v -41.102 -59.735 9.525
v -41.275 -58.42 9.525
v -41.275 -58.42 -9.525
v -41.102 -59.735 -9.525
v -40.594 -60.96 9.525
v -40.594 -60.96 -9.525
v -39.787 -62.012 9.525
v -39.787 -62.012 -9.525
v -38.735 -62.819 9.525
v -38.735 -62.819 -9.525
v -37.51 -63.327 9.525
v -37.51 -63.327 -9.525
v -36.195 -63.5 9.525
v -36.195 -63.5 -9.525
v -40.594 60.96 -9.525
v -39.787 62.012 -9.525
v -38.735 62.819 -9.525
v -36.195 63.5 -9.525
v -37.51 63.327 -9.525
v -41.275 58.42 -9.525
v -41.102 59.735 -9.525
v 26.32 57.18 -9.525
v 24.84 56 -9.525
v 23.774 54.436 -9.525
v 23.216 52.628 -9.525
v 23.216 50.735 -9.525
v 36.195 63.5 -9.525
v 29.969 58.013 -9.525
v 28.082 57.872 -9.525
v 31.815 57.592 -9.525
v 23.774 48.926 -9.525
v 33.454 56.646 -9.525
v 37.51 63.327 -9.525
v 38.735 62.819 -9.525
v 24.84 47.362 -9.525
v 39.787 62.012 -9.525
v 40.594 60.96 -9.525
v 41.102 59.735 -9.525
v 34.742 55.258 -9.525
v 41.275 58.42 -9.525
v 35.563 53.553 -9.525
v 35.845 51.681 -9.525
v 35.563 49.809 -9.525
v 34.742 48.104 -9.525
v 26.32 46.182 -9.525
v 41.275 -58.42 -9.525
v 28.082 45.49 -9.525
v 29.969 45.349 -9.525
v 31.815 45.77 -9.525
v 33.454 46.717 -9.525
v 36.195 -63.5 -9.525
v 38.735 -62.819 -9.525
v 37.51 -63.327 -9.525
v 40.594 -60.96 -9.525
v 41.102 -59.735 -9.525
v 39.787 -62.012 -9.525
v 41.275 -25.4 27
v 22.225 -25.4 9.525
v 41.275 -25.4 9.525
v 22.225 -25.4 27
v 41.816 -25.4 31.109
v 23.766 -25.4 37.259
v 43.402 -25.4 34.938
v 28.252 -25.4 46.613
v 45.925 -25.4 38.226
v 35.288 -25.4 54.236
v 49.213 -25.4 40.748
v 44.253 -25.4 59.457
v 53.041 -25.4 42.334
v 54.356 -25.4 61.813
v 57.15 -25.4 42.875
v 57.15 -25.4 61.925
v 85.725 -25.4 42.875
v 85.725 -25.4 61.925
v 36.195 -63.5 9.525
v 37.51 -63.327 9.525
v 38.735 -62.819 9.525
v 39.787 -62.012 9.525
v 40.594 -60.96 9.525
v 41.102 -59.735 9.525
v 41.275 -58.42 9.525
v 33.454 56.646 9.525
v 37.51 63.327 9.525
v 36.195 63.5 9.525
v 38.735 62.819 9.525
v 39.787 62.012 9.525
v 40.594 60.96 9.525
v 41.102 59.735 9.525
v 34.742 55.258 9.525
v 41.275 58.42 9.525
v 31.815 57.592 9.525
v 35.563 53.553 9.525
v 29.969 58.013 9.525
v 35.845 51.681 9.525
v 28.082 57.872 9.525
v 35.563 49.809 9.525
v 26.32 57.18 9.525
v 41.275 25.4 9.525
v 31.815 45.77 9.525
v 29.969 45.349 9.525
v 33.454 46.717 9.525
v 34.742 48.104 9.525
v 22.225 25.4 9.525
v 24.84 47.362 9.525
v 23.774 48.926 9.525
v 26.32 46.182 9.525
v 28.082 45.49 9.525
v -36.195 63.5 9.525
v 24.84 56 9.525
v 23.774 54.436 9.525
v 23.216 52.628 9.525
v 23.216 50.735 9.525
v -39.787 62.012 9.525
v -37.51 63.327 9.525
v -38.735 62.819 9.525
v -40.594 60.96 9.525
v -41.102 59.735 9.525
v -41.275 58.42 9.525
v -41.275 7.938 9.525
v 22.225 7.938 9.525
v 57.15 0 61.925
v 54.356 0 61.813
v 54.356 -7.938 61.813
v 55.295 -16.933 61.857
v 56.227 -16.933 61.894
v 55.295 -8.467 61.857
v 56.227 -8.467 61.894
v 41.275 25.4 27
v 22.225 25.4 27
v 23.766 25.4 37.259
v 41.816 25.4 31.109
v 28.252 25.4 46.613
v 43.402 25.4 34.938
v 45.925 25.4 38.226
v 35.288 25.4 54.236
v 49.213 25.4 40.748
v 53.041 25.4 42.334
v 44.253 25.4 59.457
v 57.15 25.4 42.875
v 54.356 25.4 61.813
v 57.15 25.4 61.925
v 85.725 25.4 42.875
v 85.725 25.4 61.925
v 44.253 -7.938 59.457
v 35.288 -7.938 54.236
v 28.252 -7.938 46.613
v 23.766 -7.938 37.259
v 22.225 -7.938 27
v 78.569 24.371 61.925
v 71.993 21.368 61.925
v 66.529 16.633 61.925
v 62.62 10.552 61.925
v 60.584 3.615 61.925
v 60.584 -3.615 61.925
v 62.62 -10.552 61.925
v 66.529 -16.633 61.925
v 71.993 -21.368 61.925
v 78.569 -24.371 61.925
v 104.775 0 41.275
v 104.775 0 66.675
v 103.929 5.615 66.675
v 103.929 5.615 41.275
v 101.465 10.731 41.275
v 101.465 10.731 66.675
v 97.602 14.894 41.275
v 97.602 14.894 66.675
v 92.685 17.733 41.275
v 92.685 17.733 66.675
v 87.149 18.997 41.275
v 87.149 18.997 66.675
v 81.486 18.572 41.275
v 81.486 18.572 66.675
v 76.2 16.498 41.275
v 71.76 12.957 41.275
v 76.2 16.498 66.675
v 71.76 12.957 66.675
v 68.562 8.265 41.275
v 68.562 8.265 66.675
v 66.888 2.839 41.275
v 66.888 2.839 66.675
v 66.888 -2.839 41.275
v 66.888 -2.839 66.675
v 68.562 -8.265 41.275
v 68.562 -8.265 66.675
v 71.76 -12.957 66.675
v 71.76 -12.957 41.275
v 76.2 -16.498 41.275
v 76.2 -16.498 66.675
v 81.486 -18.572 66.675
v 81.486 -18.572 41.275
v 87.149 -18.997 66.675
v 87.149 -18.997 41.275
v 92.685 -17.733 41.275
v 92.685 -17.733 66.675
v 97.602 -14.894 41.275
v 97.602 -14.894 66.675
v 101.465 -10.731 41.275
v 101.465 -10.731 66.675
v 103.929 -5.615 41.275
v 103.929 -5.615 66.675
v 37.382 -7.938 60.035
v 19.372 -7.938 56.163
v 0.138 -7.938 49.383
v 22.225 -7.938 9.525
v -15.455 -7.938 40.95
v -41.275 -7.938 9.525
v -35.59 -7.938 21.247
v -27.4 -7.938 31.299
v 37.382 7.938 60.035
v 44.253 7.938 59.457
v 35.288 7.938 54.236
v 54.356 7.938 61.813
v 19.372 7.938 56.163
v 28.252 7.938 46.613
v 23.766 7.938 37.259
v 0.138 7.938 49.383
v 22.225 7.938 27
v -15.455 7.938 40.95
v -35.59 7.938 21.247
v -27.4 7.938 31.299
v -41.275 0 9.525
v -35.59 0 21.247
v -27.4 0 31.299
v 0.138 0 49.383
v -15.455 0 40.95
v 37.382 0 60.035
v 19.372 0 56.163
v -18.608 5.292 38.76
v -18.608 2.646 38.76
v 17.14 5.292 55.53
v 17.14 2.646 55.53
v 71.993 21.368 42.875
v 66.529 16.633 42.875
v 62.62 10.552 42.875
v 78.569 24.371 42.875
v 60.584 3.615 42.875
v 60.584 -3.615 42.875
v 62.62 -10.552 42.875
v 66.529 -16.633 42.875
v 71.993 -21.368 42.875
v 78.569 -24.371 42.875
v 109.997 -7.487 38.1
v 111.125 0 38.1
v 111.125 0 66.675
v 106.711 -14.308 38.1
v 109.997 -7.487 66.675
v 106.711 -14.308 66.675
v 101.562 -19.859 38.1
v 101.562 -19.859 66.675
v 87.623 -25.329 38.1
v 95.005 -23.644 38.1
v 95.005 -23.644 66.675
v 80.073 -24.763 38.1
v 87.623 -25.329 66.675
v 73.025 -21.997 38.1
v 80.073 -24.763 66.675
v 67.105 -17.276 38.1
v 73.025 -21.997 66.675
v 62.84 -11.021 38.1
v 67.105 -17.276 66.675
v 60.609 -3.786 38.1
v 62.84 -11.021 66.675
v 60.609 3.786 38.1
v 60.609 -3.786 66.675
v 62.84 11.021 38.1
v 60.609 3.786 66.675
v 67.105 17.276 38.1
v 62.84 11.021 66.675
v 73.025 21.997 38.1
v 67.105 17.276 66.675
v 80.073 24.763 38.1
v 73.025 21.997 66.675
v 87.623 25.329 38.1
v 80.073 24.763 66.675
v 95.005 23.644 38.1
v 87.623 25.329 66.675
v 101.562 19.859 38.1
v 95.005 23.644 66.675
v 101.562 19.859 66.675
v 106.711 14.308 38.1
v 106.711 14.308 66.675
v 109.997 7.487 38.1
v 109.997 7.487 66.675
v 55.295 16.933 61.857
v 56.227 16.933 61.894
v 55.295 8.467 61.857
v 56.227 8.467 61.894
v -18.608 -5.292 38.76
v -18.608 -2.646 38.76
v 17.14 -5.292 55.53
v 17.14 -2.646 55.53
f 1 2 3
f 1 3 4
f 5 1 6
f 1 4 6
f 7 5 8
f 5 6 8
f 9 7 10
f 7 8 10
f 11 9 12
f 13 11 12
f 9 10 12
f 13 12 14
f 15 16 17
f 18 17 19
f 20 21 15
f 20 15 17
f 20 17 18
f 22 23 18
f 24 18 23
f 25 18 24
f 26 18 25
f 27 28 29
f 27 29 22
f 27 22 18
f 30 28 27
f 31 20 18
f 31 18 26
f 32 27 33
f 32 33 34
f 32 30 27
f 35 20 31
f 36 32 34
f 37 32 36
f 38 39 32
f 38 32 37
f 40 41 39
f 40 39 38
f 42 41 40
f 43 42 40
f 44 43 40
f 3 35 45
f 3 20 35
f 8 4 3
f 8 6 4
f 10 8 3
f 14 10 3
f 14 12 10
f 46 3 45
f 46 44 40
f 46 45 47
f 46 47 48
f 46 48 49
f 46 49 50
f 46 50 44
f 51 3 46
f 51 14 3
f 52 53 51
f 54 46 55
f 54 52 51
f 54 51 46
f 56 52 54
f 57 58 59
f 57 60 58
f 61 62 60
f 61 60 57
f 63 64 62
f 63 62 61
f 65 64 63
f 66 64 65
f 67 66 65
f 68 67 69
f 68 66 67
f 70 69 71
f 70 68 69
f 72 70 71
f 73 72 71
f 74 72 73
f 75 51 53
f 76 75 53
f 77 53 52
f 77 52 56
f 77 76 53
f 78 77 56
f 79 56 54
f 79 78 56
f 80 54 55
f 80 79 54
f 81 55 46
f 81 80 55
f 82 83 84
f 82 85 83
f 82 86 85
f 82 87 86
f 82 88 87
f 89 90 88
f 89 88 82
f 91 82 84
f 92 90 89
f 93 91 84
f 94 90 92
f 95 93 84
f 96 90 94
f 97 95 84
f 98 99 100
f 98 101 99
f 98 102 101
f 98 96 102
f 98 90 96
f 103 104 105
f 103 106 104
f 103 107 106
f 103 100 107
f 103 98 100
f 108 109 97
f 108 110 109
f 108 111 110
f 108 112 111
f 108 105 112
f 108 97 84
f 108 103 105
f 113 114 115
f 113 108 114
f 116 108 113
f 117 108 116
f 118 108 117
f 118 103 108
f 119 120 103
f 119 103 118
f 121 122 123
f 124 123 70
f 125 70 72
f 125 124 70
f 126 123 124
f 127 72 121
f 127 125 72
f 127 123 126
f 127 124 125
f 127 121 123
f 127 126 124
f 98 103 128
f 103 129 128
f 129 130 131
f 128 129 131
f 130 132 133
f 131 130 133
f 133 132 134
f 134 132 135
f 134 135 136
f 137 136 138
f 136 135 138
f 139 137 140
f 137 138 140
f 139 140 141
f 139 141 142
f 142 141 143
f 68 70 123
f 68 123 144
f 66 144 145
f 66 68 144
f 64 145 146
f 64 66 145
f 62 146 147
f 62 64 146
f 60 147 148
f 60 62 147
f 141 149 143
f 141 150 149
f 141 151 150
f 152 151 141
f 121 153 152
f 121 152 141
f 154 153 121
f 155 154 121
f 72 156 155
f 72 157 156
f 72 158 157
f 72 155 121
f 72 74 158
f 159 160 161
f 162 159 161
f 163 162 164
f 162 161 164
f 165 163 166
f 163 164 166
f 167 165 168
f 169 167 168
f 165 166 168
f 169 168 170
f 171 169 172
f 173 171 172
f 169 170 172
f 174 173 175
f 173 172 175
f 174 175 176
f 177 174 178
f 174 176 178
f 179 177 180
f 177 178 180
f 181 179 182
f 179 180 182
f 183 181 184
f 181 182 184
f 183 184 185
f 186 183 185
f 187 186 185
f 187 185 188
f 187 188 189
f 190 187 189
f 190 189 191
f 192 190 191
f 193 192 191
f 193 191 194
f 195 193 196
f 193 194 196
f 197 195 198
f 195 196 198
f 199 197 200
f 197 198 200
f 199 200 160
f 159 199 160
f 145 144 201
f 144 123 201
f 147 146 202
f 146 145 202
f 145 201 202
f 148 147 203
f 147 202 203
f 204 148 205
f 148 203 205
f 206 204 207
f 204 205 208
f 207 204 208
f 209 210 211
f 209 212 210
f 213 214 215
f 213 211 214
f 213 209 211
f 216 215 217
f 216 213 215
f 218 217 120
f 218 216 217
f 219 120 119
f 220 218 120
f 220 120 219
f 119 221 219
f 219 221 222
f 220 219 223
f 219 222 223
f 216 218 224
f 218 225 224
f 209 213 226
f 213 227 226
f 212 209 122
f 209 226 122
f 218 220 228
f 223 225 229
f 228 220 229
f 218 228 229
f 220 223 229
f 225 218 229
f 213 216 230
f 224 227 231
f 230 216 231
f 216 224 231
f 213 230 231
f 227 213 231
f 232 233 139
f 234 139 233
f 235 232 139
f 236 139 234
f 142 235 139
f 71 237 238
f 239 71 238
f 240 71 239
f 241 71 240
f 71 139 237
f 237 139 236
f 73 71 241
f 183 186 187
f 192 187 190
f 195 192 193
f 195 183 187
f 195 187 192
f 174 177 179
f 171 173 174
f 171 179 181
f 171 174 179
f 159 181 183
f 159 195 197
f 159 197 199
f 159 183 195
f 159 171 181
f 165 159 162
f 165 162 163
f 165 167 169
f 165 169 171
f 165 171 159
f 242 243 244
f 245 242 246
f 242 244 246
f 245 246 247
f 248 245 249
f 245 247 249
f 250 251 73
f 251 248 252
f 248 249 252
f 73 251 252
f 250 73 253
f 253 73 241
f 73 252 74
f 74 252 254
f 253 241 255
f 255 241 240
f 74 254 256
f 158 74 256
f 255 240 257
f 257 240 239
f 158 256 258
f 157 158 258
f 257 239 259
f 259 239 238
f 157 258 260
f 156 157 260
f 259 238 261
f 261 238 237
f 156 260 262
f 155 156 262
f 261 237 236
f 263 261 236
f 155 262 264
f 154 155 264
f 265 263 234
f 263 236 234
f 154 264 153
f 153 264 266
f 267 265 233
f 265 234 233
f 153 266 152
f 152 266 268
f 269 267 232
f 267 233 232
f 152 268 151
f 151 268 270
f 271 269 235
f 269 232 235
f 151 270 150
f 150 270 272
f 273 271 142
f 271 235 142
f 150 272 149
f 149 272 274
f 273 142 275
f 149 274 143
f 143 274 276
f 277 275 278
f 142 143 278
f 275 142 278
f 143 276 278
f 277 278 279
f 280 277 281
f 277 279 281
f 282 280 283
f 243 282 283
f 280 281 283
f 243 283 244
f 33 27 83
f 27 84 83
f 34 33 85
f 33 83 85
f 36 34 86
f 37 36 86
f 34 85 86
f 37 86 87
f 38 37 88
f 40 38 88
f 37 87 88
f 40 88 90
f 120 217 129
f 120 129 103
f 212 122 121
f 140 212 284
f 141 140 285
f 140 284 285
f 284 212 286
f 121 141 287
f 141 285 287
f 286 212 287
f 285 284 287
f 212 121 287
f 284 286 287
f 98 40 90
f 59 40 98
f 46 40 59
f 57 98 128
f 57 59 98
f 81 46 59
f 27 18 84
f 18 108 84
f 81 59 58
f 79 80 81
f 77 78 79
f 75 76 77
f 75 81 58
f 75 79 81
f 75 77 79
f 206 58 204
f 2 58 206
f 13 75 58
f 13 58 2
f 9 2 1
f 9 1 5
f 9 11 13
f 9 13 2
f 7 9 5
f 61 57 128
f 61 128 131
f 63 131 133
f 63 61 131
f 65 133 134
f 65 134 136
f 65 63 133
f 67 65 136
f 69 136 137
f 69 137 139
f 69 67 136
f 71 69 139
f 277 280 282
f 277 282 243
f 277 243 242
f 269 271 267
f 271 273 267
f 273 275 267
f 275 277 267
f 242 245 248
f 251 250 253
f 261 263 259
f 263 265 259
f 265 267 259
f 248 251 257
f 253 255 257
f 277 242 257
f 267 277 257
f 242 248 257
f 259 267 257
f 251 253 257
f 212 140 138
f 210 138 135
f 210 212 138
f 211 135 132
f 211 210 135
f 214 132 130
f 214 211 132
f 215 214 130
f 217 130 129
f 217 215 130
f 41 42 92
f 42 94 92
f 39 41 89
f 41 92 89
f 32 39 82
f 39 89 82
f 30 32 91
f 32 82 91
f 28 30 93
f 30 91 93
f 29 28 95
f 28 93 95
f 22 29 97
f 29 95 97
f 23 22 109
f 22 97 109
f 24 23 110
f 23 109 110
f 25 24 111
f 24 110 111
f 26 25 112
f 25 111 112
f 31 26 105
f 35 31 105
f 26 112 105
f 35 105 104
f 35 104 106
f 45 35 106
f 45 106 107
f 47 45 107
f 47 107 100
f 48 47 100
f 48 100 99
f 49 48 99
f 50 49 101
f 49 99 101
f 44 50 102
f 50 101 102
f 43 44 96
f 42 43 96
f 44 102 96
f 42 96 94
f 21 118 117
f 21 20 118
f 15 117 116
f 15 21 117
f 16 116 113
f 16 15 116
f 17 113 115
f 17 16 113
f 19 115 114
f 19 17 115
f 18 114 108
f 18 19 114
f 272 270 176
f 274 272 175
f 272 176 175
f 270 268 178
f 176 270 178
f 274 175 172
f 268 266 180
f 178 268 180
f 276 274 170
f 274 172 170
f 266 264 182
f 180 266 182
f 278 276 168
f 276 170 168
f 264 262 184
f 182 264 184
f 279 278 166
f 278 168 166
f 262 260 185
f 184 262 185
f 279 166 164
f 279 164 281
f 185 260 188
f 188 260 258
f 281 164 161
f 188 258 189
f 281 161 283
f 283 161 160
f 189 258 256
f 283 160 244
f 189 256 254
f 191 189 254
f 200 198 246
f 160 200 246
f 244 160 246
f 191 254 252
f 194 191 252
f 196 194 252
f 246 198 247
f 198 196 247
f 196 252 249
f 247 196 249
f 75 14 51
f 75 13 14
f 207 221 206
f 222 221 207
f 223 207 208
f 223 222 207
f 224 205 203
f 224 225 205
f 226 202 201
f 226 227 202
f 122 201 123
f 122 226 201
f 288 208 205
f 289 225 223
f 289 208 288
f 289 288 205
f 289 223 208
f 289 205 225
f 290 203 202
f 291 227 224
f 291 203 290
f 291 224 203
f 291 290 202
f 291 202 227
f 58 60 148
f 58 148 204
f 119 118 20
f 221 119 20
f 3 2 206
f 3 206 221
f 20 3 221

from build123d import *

# Parameters (mm, degrees)
F1_DEPTH = 63.5
F0_W     = 25.4
F0_H     = 19.05
F2_DEPTH = 25.4
F3_DEPTH = 7.9375
F4_R     = 5.08
F6_R     = 6.35
F7_DEPTH = 50.8
F8_R     = 19.05
F9_DEPTH = 25.4


with BuildPart() as f1:
    # F0 (on Front) → F1 (new body, symmetric)
    with BuildSketch(Plane.XZ):
        Polygon((-41.275, -9.525), (41.275, -9.525), (41.275, 9.525), (22.225, 9.525), (-41.275, 9.525), align=None)
    extrude(amount=F1_DEPTH, both=True)

    # F0 (on Front) → F2 (join, symmetric)
    with BuildSketch(Plane.XZ):
        with BuildLine():
            Line((22.225, 9.525), (41.275, 9.525))
            Line((41.275, 9.525), (41.275, 27.0002))
            ThreePointArc((41.275, 27.0002), (45.9246798487, 38.2255201513), (57.15, 42.8752))
            Line((57.15, 42.8752), (60.325, 42.8752))
            Line((60.325, 42.8752), (60.325, 61.9252))
            Line((60.325, 61.9252), (57.15, 61.9252))
            add(Edge.make_bspline(
                [(54.3558038177, 61.8132448639), (55.2992353906, 61.8602813509), (56.2310037171, 61.8975367589), (57.15, 61.9252)],
                knots=[108.500811641, 108.500811641, 108.500811641, 108.500811641, 111.5045361635, 111.5045361635, 111.5045361635, 111.5045361635], degree=3))
            ThreePointArc((54.3558038177, 61.8132448639), (31.4854044775, 50.6874151522), (22.225, 27.0002))
            Line((22.225, 27.0002), (22.225, 9.525))
        make_face()
        with Locations((73.025, 52.4002)):
            Rectangle(F0_W, F0_H)
    extrude(amount=F2_DEPTH, both=True)

    # F0 (on Front) → F3 (join, symmetric)
    with BuildSketch(Plane.XZ):
        with BuildLine():
            add(Edge.make_bspline(
                [(-41.275, 9.525), (-29.0199070695, 45.652726812), (20.2770823423, 60.114188583), (54.3558038177, 61.8132448639)],
                knots=[0, 0, 0, 0, 108.500811641, 108.500811641, 108.500811641, 108.500811641], degree=3))
            Line((-41.275, 9.525), (22.225, 9.525))
            Line((22.225, 9.525), (22.225, 27.0002))
            ThreePointArc((22.225, 27.0002), (31.4854044775, 50.6874151522), (54.3558038177, 61.8132448639))
        make_face()
    extrude(amount=F3_DEPTH, both=True)

    # F4
    f4_edges = [f1.edges().sort_by_distance(p)[0] for p in [
        (41.275, -63.5, 0),
        (-41.275, -63.5, 0),
        (-41.275, 63.5, 0),
        (41.275, 63.5, 0),
    ]]
    fillet(f4_edges, radius=F4_R)

    # F0 (on Front) → F5 (revolve)
    with BuildSketch(Plane.XZ):
        Polygon((85.725, 61.9252), (85.725, 42.8752), (85.725, 38.1), (111.125, 38.1), (111.125, 66.675), (85.725, 66.675), align=None)
    revolve(axis=Axis((85.725, 0, 52.3875), (0, 0, -1)))

    # F6 (on face) → F7 (cut, symmetric)
    with BuildSketch(Plane.XY.offset(9.525)):
        with Locations((29.4948853552, 51.6811832786)):
            Circle(F6_R)
    extrude(amount=F7_DEPTH, both=True, mode=Mode.SUBTRACT)

    # F8 (on face) → F9 (cut)
    with BuildSketch(Plane.XY.offset(66.675)):
        with Locations((85.725, 0)):
            Circle(F8_R)
    extrude(amount=-F9_DEPTH, mode=Mode.SUBTRACT)


solid = f1.part
